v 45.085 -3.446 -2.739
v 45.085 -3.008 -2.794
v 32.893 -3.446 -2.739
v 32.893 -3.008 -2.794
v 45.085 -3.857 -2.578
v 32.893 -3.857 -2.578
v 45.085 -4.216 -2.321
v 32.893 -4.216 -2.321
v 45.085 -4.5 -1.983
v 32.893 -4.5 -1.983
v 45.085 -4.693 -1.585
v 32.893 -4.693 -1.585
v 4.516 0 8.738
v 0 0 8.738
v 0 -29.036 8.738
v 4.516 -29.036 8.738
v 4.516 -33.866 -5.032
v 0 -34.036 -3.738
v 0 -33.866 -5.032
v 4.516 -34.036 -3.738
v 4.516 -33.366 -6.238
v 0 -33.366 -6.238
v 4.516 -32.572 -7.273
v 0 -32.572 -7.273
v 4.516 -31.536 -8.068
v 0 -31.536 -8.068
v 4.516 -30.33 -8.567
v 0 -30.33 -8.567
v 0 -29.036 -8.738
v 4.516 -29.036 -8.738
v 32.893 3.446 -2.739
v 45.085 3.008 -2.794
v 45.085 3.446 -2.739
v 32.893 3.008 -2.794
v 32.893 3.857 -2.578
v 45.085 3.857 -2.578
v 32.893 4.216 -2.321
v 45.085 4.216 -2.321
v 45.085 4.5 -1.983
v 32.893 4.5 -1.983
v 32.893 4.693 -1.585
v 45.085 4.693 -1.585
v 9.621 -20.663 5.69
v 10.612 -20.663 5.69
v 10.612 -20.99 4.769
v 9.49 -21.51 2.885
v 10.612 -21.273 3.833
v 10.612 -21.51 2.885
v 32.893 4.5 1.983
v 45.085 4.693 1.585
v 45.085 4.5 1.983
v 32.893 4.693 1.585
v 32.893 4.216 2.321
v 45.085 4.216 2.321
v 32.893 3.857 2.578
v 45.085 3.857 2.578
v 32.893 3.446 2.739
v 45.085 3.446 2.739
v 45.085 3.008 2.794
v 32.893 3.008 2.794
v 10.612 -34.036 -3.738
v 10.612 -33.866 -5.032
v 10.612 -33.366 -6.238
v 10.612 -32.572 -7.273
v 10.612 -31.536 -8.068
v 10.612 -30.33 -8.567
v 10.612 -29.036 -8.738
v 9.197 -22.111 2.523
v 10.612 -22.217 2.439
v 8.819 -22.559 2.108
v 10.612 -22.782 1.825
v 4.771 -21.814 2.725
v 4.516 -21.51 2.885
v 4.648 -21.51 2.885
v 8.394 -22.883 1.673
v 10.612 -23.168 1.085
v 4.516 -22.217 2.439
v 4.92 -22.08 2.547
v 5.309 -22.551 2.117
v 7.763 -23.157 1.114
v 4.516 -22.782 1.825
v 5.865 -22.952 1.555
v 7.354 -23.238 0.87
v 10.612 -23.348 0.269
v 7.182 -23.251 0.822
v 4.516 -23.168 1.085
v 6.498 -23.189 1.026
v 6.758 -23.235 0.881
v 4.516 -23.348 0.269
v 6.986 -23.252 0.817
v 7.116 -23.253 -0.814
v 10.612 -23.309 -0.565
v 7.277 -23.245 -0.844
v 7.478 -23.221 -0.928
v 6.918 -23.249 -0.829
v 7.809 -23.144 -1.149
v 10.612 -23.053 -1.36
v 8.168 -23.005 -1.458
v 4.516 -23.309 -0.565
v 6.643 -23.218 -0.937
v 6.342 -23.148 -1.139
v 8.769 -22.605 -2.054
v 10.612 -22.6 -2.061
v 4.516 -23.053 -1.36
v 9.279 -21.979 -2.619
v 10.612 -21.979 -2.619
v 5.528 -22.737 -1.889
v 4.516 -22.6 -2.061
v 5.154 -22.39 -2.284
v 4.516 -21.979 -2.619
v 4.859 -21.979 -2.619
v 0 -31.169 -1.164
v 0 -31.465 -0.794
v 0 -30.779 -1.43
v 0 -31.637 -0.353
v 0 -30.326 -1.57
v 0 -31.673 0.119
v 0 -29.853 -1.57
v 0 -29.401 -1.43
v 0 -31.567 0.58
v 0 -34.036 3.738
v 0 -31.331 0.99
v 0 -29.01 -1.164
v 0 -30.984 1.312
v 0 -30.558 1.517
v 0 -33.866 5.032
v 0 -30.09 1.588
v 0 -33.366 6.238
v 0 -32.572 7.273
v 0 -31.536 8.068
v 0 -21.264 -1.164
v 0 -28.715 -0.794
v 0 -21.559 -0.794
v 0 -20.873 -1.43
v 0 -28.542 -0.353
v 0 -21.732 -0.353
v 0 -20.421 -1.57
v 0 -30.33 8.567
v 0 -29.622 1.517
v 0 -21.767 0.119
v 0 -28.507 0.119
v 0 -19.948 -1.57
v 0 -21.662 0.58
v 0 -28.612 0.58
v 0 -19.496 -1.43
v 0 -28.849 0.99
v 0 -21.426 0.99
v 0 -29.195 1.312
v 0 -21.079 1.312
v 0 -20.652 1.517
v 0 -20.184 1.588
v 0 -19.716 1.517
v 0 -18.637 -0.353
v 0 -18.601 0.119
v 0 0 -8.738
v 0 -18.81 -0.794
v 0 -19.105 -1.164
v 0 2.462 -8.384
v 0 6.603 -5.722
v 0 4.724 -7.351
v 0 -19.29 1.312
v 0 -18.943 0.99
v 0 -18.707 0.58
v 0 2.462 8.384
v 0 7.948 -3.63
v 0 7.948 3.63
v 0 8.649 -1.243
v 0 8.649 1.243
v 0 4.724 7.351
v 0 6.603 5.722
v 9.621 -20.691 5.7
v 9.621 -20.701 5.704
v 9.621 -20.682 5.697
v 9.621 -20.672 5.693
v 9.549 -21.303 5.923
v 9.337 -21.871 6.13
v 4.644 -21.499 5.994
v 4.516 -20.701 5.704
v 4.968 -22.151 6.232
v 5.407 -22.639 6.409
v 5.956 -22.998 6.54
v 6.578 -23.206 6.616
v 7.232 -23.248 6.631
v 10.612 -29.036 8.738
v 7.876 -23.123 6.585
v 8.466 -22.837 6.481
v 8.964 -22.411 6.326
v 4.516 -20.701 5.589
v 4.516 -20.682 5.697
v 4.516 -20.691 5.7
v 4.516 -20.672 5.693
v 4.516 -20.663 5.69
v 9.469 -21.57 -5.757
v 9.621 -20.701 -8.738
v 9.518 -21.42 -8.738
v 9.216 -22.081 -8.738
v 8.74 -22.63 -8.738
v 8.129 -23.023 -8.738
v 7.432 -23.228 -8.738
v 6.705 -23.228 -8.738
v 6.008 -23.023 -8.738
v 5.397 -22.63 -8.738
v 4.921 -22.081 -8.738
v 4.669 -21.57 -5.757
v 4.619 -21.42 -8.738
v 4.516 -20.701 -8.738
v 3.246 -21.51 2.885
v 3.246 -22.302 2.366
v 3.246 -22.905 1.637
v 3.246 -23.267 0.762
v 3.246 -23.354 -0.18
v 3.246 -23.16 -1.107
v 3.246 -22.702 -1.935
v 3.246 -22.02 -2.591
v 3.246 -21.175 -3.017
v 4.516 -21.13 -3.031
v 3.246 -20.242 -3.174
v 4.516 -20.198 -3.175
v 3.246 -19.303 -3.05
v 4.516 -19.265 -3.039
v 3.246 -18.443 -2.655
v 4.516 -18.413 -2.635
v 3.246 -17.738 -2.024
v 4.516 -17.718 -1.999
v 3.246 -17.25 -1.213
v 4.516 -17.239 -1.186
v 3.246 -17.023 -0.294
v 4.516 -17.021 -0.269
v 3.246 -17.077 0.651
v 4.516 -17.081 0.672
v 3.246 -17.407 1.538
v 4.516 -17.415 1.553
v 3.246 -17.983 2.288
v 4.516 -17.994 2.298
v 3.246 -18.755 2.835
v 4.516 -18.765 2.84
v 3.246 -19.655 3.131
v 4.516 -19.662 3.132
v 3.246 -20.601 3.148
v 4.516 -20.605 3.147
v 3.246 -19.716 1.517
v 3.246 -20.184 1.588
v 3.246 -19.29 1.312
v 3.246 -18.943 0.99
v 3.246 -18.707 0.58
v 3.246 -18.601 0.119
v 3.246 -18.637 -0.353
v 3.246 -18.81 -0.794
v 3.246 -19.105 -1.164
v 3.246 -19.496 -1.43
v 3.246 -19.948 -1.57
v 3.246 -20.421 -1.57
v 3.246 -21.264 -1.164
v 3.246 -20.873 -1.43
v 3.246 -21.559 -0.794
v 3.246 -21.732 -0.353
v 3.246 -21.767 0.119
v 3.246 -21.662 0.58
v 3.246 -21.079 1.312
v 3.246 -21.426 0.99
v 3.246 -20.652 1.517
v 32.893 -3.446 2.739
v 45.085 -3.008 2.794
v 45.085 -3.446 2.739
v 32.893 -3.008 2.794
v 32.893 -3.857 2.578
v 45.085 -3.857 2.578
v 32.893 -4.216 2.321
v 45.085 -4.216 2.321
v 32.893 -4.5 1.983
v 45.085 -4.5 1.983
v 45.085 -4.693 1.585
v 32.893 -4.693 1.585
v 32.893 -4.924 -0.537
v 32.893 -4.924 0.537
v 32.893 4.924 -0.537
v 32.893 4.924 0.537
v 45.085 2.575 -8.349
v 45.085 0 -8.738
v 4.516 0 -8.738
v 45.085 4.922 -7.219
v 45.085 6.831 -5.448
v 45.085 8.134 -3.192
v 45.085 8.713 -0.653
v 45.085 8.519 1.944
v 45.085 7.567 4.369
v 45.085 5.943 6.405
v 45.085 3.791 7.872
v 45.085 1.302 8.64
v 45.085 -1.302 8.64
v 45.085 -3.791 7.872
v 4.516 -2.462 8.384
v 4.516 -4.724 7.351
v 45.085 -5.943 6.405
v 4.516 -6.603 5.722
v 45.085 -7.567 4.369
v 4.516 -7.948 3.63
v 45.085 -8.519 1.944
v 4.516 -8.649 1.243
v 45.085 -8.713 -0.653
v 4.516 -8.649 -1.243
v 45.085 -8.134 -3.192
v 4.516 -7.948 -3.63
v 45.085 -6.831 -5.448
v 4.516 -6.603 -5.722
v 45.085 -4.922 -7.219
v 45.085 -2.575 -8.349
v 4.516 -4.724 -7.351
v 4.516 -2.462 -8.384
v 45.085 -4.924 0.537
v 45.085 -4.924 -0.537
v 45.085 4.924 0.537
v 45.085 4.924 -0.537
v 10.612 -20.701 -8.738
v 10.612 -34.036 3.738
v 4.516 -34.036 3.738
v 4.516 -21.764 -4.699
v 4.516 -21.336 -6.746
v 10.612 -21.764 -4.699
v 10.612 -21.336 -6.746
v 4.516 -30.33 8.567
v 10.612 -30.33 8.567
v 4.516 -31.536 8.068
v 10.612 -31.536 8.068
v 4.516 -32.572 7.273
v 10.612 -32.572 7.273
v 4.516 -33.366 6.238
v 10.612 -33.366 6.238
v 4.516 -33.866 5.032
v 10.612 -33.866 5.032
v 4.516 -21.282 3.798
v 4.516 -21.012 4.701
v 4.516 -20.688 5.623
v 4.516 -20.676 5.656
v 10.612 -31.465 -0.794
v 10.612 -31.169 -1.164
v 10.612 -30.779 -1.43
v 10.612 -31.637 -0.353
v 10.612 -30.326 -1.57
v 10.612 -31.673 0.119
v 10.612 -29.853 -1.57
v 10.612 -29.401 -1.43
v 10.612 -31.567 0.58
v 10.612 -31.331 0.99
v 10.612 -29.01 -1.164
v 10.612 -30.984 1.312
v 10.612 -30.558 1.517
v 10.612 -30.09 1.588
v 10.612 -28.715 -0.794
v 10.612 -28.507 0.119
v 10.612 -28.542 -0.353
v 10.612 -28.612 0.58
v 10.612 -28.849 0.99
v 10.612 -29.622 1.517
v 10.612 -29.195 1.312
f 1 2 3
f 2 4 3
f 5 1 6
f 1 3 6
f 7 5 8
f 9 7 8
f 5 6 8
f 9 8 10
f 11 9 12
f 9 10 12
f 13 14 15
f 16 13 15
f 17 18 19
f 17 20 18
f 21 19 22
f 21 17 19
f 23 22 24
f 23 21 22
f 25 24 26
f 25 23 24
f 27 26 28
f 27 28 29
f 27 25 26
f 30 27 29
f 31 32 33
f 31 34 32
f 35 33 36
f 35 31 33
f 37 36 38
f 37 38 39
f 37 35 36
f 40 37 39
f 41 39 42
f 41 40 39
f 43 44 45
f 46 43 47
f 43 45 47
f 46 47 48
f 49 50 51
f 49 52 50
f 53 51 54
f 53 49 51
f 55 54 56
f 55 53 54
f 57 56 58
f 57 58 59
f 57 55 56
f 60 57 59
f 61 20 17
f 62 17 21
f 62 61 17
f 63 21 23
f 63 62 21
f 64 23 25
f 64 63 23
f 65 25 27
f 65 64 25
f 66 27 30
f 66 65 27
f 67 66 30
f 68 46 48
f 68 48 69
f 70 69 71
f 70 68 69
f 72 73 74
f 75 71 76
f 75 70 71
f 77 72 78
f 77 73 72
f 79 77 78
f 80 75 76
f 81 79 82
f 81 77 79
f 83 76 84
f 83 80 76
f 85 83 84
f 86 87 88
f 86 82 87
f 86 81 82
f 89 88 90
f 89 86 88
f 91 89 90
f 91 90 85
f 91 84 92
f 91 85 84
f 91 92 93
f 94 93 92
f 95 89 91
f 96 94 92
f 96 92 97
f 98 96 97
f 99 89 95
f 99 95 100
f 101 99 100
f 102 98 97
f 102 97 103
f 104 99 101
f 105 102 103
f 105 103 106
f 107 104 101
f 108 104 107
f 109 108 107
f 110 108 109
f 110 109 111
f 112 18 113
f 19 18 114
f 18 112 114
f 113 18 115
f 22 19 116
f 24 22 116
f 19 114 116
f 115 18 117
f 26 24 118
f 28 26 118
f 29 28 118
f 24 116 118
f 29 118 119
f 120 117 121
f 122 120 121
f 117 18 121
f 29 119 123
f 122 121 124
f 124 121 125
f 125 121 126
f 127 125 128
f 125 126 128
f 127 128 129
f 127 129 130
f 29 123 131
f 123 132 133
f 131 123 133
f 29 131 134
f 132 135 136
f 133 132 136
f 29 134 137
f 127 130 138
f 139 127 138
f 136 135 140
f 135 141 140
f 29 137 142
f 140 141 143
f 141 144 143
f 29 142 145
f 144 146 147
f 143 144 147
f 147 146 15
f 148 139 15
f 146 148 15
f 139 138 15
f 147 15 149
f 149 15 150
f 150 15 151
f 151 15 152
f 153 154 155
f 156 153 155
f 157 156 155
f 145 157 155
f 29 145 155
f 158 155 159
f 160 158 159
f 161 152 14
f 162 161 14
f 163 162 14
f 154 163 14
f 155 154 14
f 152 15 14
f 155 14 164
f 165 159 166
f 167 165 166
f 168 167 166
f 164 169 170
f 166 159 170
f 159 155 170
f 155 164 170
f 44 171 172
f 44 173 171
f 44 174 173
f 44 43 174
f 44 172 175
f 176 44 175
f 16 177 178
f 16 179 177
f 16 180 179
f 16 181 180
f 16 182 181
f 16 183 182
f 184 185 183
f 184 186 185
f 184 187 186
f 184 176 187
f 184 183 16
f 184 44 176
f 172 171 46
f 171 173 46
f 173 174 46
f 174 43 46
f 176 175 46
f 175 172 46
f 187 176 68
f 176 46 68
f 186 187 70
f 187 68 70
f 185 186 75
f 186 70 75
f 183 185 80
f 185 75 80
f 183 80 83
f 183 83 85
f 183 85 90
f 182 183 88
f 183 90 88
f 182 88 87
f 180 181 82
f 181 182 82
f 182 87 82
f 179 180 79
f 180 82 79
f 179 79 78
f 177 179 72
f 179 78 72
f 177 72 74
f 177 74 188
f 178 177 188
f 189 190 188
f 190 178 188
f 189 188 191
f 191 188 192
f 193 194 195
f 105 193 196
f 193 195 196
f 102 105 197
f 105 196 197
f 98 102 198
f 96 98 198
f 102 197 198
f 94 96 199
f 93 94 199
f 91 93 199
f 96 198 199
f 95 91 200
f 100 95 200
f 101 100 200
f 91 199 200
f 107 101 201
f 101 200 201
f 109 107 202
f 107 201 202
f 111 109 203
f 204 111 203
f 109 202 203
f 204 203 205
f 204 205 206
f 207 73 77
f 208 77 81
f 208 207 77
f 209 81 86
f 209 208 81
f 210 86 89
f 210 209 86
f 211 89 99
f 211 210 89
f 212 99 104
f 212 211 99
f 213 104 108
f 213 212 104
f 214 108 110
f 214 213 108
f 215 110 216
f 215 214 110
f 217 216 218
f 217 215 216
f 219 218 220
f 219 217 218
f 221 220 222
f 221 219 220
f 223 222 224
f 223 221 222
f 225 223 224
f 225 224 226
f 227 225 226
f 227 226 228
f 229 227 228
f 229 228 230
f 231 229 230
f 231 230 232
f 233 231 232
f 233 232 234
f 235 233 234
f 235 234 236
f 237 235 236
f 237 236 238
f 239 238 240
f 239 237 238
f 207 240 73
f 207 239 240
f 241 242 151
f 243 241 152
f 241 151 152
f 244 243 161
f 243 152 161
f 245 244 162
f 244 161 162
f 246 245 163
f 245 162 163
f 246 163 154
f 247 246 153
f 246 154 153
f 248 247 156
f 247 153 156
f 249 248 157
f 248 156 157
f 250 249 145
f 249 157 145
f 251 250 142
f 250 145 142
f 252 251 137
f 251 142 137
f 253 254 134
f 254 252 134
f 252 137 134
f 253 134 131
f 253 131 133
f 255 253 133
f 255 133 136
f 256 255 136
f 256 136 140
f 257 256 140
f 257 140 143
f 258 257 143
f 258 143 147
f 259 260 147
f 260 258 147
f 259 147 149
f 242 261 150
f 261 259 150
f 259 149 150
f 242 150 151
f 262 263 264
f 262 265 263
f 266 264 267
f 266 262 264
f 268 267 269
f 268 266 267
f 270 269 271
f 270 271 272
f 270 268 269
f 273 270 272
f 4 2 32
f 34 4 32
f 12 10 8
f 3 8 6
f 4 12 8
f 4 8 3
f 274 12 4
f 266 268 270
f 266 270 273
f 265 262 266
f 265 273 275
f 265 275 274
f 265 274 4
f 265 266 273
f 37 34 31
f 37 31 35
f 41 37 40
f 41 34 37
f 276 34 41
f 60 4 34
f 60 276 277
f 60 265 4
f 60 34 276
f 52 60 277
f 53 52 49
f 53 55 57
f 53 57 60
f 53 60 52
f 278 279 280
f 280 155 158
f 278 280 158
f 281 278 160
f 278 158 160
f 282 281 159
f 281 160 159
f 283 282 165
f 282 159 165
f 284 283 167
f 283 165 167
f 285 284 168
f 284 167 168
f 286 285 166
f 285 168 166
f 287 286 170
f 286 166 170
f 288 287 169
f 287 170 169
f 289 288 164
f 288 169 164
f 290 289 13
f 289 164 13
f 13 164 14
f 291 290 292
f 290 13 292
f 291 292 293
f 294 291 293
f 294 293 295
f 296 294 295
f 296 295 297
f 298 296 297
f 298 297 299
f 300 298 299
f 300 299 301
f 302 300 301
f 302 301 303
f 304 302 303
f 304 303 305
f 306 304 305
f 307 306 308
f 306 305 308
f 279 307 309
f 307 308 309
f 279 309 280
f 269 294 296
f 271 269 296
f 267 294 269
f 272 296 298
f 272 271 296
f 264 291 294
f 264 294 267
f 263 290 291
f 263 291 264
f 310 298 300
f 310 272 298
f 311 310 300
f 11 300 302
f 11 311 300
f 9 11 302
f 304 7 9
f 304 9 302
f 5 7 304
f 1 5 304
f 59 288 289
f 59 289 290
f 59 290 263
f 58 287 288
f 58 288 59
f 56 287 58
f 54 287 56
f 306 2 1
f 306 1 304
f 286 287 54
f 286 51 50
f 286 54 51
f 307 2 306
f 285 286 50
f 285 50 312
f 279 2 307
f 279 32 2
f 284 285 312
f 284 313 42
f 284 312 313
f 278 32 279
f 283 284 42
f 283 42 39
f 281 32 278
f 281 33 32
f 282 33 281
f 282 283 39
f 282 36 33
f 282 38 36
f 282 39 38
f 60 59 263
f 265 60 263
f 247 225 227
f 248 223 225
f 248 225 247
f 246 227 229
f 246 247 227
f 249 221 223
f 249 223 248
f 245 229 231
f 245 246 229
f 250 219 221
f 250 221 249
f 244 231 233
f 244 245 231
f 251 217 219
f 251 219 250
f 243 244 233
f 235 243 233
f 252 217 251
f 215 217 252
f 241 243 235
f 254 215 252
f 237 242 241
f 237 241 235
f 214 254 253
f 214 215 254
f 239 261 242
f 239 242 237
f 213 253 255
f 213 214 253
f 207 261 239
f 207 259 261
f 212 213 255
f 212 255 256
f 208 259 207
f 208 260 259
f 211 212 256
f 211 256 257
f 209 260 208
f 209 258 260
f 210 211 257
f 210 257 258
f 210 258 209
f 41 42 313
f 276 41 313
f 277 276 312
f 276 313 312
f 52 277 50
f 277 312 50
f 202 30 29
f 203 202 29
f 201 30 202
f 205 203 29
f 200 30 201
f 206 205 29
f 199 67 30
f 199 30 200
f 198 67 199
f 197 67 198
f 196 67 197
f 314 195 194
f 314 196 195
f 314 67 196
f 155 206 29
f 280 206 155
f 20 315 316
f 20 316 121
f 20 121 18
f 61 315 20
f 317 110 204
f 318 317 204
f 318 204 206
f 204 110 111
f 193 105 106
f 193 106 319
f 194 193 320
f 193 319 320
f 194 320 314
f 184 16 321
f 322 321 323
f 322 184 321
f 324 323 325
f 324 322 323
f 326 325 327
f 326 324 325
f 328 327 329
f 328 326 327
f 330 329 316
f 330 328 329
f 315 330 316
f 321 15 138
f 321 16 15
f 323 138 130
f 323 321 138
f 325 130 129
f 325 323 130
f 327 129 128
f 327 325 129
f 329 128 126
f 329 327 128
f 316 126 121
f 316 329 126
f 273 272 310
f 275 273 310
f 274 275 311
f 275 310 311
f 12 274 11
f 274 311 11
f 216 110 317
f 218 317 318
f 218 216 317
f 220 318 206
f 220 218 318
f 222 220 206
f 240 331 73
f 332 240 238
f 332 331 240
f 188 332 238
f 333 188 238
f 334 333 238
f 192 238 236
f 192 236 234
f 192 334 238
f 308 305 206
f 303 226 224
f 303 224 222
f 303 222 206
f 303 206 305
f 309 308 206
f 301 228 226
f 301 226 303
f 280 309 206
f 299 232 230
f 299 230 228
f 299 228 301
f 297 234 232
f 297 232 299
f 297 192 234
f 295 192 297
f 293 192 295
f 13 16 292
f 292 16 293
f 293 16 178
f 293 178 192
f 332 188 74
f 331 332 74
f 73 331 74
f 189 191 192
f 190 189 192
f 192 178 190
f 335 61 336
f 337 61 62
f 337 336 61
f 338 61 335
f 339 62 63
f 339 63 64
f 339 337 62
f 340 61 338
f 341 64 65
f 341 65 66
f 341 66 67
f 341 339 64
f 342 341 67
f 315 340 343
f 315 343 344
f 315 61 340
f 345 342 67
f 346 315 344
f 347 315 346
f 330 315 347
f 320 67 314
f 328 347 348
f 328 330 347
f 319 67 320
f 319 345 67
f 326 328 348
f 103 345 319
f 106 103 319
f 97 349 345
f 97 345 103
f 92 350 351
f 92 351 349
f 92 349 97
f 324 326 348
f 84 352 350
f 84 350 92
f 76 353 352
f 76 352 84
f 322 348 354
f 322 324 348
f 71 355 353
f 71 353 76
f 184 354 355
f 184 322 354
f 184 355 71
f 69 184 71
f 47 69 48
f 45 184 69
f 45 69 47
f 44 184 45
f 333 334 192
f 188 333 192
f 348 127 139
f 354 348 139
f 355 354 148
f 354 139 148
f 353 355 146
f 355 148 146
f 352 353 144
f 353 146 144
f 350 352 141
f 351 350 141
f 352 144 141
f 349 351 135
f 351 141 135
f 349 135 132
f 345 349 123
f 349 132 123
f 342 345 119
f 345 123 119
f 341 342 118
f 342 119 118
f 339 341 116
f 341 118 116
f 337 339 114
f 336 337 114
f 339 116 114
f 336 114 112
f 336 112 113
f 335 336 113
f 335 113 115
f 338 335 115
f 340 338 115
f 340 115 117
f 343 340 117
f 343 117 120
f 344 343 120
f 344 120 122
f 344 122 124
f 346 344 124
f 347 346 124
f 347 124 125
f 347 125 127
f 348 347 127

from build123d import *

# Parameters (mm, degrees)
SKETCH1_R           = 8.7376
BOSS_EXTRUDE1_DEPTH = 45.085
BOSS_EXTRUDE3_DEPTH = 4.516000112
FILLET2_R           = 5
BOSS_EXTRUDE4_START = 6.096
BOSS_EXTRUDE4_DEPTH = 6.096
CUT_EXTRUDE8_DEPTH  = 6.096
CUT_EXTRUDE10_DEPTH = 12.192
SKETCH23_R          = 1.5875
CUT_EXTRUDE11_DEPTH = 58.161632016
SKETCH24_R          = 3.175
SKETCH24_R_2        = 1.5875
CUT_EXTRUDE12_DEPTH = 54.671581882
CUT_EXTRUDE13_START = -1.27
SKETCH24_2_R        = 3.175
SKETCH24_2_R_2      = 1.5875
CUT_EXTRUDE13_DEPTH = 1.27
FILLET11_R          = 1.778
SKETCH25_R          = 2.5527
CUT_EXTRUDE14_DEPTH = 60.13111817


with BuildPart() as part:
    # Sketch1 → Boss-Extrude1 (new body)
    with BuildSketch(Plane.YZ):
        with Locations(Location((0, 0, 0), (0, 0, 270))):
            Circle(SKETCH1_R)
    extrude(amount=BOSS_EXTRUDE1_DEPTH)

    # Sketch10 → Boss-Extrude3 (add)
    with BuildSketch(Plane(origin=(0, 0, 0), x_dir=(0, -1, 0), z_dir=(-1, 0, 0))):
        with BuildLine():
            Line((0, 8.7376), (34.036, 8.7376))
            Line((34.036, 8.7376), (34.036, -8.7376))
            Line((34.036, -8.7376), (0, -8.7376))
            ThreePointArc((0, -8.7376), (8.7376, 0), (0, 8.7376))
        make_face()
    extrude(amount=-BOSS_EXTRUDE3_DEPTH)

    # Fillet2
    fillet2_edges = [part.edges().sort_by_distance(p)[0] for p in [
        (2.258000056, -34.036, 8.7376),
        (2.258000056, -34.036, -8.7376),
    ]]
    fillet(fillet2_edges, radius=FILLET2_R)

    # Sketch15 → Boss-Extrude4 (add)
    with BuildSketch(Plane.YZ.offset(4.516000112).offset(BOSS_EXTRUDE4_START)):
        with BuildLine():
            Line((-20.066, 5.472786999), (-29.036, 8.7376))
            ThreePointArc((-29.036, 8.7376), (-32.571533906, 7.273133906), (-34.036, 3.7376))
            Line((-34.036, 3.7376), (-34.036, -3.7376))
            ThreePointArc((-34.036, -3.7376), (-32.571533906, -7.273133906), (-29.036, -8.7376))
            Line((-29.036, -8.7376), (-20.066, -8.7376))
            Line((-20.066, -8.7376), (-20.066, 5.472786999))
        make_face()
    extrude(amount=-BOSS_EXTRUDE4_DEPTH)

    # Sketch21 → Cut-Extrude8 (cut)
    with BuildSketch(Plane.YZ.offset(10.612000112)):
        with BuildLine():
            Line((-20.701, -8.7376), (-20.066, -8.7376))
            Line((-20.066, -8.7376), (-20.066, 5.472786999))
            Line((-20.066, 5.472786999), (-20.662704814, 5.68996979))
            ThreePointArc((-20.662704814, 5.68996979), (-22.005444378, -1.520301887), (-20.701, -8.7376))
        make_face()
    extrude(amount=-CUT_EXTRUDE8_DEPTH, mode=Mode.SUBTRACT)

    # Sketch22 → Cut-Extrude10 (cut)
    with BuildSketch(Plane.YZ.offset(45.085)):
        with BuildLine():
            Line((-4.089715516, -2.794), (4.089715516, -2.794))
            ThreePointArc((4.089715516, -2.794), (4.953, 0), (4.089715516, 2.794))
            Line((4.089715516, 2.794), (-4.089715516, 2.794))
            ThreePointArc((-4.089715516, 2.794), (-4.953, 0), (-4.089715516, -2.794))
        make_face()
    extrude(amount=-CUT_EXTRUDE10_DEPTH, mode=Mode.SUBTRACT)

    # Sketch23 → Cut-Extrude11 (cut, through all)
    with BuildSketch(Plane.ZY):
        with Locations((0, -30.089710358)):
            Circle(SKETCH23_R)
        with Locations((0, -20.184348406)):
            Circle(SKETCH23_R)
    extrude(amount=-CUT_EXTRUDE11_DEPTH, mode=Mode.SUBTRACT)

    # Sketch24 → Cut-Extrude12 (cut, through all)
    with BuildSketch(Plane.YZ.offset(4.516000112)):
        with Locations((-20.184348406, 0)):
            Circle(SKETCH24_R)
        with Locations(Location((-20.184348406, 0, 0), (0, 0, 90))):
            Circle(SKETCH24_R_2, mode=Mode.SUBTRACT)
    extrude(amount=CUT_EXTRUDE12_DEPTH, mode=Mode.SUBTRACT)

    # Sketch24<2> → Cut-Extrude13 (cut)
    with BuildSketch(Plane.YZ.offset(4.516000112).offset(CUT_EXTRUDE13_START)):
        with Locations(Location((-20.184348406, 0, 0), (0, 0, 114.682734544))):
            Circle(SKETCH24_2_R)
        with Locations(Location((-20.184348406, 0, 0), (0, 0, 90))):
            Circle(SKETCH24_2_R_2, mode=Mode.SUBTRACT)
    extrude(amount=CUT_EXTRUDE13_DEPTH, mode=Mode.SUBTRACT)

    # Fillet11
    fillet11_edges = [part.edges().sort_by_distance(p)[0] for p in [
        (38.989, 4.089715516, 2.794),
        (38.989, 4.089715516, -2.794),
        (38.989, -4.089715516, -2.794),
        (38.989, -4.089715516, 2.794),
    ]]
    fillet(fillet11_edges, radius=FILLET11_R)

    # Sketch25 → Cut-Extrude14 (cut, through all)
    with BuildSketch(Plane(origin=(0, 0, -8.7376), x_dir=(1, 0, 0), z_dir=(0, 0, -1))):
        with Locations((7.068700112, 20.701)):
            Circle(SKETCH25_R)
    extrude(amount=-CUT_EXTRUDE14_DEPTH, mode=Mode.SUBTRACT)


solid = part.part
